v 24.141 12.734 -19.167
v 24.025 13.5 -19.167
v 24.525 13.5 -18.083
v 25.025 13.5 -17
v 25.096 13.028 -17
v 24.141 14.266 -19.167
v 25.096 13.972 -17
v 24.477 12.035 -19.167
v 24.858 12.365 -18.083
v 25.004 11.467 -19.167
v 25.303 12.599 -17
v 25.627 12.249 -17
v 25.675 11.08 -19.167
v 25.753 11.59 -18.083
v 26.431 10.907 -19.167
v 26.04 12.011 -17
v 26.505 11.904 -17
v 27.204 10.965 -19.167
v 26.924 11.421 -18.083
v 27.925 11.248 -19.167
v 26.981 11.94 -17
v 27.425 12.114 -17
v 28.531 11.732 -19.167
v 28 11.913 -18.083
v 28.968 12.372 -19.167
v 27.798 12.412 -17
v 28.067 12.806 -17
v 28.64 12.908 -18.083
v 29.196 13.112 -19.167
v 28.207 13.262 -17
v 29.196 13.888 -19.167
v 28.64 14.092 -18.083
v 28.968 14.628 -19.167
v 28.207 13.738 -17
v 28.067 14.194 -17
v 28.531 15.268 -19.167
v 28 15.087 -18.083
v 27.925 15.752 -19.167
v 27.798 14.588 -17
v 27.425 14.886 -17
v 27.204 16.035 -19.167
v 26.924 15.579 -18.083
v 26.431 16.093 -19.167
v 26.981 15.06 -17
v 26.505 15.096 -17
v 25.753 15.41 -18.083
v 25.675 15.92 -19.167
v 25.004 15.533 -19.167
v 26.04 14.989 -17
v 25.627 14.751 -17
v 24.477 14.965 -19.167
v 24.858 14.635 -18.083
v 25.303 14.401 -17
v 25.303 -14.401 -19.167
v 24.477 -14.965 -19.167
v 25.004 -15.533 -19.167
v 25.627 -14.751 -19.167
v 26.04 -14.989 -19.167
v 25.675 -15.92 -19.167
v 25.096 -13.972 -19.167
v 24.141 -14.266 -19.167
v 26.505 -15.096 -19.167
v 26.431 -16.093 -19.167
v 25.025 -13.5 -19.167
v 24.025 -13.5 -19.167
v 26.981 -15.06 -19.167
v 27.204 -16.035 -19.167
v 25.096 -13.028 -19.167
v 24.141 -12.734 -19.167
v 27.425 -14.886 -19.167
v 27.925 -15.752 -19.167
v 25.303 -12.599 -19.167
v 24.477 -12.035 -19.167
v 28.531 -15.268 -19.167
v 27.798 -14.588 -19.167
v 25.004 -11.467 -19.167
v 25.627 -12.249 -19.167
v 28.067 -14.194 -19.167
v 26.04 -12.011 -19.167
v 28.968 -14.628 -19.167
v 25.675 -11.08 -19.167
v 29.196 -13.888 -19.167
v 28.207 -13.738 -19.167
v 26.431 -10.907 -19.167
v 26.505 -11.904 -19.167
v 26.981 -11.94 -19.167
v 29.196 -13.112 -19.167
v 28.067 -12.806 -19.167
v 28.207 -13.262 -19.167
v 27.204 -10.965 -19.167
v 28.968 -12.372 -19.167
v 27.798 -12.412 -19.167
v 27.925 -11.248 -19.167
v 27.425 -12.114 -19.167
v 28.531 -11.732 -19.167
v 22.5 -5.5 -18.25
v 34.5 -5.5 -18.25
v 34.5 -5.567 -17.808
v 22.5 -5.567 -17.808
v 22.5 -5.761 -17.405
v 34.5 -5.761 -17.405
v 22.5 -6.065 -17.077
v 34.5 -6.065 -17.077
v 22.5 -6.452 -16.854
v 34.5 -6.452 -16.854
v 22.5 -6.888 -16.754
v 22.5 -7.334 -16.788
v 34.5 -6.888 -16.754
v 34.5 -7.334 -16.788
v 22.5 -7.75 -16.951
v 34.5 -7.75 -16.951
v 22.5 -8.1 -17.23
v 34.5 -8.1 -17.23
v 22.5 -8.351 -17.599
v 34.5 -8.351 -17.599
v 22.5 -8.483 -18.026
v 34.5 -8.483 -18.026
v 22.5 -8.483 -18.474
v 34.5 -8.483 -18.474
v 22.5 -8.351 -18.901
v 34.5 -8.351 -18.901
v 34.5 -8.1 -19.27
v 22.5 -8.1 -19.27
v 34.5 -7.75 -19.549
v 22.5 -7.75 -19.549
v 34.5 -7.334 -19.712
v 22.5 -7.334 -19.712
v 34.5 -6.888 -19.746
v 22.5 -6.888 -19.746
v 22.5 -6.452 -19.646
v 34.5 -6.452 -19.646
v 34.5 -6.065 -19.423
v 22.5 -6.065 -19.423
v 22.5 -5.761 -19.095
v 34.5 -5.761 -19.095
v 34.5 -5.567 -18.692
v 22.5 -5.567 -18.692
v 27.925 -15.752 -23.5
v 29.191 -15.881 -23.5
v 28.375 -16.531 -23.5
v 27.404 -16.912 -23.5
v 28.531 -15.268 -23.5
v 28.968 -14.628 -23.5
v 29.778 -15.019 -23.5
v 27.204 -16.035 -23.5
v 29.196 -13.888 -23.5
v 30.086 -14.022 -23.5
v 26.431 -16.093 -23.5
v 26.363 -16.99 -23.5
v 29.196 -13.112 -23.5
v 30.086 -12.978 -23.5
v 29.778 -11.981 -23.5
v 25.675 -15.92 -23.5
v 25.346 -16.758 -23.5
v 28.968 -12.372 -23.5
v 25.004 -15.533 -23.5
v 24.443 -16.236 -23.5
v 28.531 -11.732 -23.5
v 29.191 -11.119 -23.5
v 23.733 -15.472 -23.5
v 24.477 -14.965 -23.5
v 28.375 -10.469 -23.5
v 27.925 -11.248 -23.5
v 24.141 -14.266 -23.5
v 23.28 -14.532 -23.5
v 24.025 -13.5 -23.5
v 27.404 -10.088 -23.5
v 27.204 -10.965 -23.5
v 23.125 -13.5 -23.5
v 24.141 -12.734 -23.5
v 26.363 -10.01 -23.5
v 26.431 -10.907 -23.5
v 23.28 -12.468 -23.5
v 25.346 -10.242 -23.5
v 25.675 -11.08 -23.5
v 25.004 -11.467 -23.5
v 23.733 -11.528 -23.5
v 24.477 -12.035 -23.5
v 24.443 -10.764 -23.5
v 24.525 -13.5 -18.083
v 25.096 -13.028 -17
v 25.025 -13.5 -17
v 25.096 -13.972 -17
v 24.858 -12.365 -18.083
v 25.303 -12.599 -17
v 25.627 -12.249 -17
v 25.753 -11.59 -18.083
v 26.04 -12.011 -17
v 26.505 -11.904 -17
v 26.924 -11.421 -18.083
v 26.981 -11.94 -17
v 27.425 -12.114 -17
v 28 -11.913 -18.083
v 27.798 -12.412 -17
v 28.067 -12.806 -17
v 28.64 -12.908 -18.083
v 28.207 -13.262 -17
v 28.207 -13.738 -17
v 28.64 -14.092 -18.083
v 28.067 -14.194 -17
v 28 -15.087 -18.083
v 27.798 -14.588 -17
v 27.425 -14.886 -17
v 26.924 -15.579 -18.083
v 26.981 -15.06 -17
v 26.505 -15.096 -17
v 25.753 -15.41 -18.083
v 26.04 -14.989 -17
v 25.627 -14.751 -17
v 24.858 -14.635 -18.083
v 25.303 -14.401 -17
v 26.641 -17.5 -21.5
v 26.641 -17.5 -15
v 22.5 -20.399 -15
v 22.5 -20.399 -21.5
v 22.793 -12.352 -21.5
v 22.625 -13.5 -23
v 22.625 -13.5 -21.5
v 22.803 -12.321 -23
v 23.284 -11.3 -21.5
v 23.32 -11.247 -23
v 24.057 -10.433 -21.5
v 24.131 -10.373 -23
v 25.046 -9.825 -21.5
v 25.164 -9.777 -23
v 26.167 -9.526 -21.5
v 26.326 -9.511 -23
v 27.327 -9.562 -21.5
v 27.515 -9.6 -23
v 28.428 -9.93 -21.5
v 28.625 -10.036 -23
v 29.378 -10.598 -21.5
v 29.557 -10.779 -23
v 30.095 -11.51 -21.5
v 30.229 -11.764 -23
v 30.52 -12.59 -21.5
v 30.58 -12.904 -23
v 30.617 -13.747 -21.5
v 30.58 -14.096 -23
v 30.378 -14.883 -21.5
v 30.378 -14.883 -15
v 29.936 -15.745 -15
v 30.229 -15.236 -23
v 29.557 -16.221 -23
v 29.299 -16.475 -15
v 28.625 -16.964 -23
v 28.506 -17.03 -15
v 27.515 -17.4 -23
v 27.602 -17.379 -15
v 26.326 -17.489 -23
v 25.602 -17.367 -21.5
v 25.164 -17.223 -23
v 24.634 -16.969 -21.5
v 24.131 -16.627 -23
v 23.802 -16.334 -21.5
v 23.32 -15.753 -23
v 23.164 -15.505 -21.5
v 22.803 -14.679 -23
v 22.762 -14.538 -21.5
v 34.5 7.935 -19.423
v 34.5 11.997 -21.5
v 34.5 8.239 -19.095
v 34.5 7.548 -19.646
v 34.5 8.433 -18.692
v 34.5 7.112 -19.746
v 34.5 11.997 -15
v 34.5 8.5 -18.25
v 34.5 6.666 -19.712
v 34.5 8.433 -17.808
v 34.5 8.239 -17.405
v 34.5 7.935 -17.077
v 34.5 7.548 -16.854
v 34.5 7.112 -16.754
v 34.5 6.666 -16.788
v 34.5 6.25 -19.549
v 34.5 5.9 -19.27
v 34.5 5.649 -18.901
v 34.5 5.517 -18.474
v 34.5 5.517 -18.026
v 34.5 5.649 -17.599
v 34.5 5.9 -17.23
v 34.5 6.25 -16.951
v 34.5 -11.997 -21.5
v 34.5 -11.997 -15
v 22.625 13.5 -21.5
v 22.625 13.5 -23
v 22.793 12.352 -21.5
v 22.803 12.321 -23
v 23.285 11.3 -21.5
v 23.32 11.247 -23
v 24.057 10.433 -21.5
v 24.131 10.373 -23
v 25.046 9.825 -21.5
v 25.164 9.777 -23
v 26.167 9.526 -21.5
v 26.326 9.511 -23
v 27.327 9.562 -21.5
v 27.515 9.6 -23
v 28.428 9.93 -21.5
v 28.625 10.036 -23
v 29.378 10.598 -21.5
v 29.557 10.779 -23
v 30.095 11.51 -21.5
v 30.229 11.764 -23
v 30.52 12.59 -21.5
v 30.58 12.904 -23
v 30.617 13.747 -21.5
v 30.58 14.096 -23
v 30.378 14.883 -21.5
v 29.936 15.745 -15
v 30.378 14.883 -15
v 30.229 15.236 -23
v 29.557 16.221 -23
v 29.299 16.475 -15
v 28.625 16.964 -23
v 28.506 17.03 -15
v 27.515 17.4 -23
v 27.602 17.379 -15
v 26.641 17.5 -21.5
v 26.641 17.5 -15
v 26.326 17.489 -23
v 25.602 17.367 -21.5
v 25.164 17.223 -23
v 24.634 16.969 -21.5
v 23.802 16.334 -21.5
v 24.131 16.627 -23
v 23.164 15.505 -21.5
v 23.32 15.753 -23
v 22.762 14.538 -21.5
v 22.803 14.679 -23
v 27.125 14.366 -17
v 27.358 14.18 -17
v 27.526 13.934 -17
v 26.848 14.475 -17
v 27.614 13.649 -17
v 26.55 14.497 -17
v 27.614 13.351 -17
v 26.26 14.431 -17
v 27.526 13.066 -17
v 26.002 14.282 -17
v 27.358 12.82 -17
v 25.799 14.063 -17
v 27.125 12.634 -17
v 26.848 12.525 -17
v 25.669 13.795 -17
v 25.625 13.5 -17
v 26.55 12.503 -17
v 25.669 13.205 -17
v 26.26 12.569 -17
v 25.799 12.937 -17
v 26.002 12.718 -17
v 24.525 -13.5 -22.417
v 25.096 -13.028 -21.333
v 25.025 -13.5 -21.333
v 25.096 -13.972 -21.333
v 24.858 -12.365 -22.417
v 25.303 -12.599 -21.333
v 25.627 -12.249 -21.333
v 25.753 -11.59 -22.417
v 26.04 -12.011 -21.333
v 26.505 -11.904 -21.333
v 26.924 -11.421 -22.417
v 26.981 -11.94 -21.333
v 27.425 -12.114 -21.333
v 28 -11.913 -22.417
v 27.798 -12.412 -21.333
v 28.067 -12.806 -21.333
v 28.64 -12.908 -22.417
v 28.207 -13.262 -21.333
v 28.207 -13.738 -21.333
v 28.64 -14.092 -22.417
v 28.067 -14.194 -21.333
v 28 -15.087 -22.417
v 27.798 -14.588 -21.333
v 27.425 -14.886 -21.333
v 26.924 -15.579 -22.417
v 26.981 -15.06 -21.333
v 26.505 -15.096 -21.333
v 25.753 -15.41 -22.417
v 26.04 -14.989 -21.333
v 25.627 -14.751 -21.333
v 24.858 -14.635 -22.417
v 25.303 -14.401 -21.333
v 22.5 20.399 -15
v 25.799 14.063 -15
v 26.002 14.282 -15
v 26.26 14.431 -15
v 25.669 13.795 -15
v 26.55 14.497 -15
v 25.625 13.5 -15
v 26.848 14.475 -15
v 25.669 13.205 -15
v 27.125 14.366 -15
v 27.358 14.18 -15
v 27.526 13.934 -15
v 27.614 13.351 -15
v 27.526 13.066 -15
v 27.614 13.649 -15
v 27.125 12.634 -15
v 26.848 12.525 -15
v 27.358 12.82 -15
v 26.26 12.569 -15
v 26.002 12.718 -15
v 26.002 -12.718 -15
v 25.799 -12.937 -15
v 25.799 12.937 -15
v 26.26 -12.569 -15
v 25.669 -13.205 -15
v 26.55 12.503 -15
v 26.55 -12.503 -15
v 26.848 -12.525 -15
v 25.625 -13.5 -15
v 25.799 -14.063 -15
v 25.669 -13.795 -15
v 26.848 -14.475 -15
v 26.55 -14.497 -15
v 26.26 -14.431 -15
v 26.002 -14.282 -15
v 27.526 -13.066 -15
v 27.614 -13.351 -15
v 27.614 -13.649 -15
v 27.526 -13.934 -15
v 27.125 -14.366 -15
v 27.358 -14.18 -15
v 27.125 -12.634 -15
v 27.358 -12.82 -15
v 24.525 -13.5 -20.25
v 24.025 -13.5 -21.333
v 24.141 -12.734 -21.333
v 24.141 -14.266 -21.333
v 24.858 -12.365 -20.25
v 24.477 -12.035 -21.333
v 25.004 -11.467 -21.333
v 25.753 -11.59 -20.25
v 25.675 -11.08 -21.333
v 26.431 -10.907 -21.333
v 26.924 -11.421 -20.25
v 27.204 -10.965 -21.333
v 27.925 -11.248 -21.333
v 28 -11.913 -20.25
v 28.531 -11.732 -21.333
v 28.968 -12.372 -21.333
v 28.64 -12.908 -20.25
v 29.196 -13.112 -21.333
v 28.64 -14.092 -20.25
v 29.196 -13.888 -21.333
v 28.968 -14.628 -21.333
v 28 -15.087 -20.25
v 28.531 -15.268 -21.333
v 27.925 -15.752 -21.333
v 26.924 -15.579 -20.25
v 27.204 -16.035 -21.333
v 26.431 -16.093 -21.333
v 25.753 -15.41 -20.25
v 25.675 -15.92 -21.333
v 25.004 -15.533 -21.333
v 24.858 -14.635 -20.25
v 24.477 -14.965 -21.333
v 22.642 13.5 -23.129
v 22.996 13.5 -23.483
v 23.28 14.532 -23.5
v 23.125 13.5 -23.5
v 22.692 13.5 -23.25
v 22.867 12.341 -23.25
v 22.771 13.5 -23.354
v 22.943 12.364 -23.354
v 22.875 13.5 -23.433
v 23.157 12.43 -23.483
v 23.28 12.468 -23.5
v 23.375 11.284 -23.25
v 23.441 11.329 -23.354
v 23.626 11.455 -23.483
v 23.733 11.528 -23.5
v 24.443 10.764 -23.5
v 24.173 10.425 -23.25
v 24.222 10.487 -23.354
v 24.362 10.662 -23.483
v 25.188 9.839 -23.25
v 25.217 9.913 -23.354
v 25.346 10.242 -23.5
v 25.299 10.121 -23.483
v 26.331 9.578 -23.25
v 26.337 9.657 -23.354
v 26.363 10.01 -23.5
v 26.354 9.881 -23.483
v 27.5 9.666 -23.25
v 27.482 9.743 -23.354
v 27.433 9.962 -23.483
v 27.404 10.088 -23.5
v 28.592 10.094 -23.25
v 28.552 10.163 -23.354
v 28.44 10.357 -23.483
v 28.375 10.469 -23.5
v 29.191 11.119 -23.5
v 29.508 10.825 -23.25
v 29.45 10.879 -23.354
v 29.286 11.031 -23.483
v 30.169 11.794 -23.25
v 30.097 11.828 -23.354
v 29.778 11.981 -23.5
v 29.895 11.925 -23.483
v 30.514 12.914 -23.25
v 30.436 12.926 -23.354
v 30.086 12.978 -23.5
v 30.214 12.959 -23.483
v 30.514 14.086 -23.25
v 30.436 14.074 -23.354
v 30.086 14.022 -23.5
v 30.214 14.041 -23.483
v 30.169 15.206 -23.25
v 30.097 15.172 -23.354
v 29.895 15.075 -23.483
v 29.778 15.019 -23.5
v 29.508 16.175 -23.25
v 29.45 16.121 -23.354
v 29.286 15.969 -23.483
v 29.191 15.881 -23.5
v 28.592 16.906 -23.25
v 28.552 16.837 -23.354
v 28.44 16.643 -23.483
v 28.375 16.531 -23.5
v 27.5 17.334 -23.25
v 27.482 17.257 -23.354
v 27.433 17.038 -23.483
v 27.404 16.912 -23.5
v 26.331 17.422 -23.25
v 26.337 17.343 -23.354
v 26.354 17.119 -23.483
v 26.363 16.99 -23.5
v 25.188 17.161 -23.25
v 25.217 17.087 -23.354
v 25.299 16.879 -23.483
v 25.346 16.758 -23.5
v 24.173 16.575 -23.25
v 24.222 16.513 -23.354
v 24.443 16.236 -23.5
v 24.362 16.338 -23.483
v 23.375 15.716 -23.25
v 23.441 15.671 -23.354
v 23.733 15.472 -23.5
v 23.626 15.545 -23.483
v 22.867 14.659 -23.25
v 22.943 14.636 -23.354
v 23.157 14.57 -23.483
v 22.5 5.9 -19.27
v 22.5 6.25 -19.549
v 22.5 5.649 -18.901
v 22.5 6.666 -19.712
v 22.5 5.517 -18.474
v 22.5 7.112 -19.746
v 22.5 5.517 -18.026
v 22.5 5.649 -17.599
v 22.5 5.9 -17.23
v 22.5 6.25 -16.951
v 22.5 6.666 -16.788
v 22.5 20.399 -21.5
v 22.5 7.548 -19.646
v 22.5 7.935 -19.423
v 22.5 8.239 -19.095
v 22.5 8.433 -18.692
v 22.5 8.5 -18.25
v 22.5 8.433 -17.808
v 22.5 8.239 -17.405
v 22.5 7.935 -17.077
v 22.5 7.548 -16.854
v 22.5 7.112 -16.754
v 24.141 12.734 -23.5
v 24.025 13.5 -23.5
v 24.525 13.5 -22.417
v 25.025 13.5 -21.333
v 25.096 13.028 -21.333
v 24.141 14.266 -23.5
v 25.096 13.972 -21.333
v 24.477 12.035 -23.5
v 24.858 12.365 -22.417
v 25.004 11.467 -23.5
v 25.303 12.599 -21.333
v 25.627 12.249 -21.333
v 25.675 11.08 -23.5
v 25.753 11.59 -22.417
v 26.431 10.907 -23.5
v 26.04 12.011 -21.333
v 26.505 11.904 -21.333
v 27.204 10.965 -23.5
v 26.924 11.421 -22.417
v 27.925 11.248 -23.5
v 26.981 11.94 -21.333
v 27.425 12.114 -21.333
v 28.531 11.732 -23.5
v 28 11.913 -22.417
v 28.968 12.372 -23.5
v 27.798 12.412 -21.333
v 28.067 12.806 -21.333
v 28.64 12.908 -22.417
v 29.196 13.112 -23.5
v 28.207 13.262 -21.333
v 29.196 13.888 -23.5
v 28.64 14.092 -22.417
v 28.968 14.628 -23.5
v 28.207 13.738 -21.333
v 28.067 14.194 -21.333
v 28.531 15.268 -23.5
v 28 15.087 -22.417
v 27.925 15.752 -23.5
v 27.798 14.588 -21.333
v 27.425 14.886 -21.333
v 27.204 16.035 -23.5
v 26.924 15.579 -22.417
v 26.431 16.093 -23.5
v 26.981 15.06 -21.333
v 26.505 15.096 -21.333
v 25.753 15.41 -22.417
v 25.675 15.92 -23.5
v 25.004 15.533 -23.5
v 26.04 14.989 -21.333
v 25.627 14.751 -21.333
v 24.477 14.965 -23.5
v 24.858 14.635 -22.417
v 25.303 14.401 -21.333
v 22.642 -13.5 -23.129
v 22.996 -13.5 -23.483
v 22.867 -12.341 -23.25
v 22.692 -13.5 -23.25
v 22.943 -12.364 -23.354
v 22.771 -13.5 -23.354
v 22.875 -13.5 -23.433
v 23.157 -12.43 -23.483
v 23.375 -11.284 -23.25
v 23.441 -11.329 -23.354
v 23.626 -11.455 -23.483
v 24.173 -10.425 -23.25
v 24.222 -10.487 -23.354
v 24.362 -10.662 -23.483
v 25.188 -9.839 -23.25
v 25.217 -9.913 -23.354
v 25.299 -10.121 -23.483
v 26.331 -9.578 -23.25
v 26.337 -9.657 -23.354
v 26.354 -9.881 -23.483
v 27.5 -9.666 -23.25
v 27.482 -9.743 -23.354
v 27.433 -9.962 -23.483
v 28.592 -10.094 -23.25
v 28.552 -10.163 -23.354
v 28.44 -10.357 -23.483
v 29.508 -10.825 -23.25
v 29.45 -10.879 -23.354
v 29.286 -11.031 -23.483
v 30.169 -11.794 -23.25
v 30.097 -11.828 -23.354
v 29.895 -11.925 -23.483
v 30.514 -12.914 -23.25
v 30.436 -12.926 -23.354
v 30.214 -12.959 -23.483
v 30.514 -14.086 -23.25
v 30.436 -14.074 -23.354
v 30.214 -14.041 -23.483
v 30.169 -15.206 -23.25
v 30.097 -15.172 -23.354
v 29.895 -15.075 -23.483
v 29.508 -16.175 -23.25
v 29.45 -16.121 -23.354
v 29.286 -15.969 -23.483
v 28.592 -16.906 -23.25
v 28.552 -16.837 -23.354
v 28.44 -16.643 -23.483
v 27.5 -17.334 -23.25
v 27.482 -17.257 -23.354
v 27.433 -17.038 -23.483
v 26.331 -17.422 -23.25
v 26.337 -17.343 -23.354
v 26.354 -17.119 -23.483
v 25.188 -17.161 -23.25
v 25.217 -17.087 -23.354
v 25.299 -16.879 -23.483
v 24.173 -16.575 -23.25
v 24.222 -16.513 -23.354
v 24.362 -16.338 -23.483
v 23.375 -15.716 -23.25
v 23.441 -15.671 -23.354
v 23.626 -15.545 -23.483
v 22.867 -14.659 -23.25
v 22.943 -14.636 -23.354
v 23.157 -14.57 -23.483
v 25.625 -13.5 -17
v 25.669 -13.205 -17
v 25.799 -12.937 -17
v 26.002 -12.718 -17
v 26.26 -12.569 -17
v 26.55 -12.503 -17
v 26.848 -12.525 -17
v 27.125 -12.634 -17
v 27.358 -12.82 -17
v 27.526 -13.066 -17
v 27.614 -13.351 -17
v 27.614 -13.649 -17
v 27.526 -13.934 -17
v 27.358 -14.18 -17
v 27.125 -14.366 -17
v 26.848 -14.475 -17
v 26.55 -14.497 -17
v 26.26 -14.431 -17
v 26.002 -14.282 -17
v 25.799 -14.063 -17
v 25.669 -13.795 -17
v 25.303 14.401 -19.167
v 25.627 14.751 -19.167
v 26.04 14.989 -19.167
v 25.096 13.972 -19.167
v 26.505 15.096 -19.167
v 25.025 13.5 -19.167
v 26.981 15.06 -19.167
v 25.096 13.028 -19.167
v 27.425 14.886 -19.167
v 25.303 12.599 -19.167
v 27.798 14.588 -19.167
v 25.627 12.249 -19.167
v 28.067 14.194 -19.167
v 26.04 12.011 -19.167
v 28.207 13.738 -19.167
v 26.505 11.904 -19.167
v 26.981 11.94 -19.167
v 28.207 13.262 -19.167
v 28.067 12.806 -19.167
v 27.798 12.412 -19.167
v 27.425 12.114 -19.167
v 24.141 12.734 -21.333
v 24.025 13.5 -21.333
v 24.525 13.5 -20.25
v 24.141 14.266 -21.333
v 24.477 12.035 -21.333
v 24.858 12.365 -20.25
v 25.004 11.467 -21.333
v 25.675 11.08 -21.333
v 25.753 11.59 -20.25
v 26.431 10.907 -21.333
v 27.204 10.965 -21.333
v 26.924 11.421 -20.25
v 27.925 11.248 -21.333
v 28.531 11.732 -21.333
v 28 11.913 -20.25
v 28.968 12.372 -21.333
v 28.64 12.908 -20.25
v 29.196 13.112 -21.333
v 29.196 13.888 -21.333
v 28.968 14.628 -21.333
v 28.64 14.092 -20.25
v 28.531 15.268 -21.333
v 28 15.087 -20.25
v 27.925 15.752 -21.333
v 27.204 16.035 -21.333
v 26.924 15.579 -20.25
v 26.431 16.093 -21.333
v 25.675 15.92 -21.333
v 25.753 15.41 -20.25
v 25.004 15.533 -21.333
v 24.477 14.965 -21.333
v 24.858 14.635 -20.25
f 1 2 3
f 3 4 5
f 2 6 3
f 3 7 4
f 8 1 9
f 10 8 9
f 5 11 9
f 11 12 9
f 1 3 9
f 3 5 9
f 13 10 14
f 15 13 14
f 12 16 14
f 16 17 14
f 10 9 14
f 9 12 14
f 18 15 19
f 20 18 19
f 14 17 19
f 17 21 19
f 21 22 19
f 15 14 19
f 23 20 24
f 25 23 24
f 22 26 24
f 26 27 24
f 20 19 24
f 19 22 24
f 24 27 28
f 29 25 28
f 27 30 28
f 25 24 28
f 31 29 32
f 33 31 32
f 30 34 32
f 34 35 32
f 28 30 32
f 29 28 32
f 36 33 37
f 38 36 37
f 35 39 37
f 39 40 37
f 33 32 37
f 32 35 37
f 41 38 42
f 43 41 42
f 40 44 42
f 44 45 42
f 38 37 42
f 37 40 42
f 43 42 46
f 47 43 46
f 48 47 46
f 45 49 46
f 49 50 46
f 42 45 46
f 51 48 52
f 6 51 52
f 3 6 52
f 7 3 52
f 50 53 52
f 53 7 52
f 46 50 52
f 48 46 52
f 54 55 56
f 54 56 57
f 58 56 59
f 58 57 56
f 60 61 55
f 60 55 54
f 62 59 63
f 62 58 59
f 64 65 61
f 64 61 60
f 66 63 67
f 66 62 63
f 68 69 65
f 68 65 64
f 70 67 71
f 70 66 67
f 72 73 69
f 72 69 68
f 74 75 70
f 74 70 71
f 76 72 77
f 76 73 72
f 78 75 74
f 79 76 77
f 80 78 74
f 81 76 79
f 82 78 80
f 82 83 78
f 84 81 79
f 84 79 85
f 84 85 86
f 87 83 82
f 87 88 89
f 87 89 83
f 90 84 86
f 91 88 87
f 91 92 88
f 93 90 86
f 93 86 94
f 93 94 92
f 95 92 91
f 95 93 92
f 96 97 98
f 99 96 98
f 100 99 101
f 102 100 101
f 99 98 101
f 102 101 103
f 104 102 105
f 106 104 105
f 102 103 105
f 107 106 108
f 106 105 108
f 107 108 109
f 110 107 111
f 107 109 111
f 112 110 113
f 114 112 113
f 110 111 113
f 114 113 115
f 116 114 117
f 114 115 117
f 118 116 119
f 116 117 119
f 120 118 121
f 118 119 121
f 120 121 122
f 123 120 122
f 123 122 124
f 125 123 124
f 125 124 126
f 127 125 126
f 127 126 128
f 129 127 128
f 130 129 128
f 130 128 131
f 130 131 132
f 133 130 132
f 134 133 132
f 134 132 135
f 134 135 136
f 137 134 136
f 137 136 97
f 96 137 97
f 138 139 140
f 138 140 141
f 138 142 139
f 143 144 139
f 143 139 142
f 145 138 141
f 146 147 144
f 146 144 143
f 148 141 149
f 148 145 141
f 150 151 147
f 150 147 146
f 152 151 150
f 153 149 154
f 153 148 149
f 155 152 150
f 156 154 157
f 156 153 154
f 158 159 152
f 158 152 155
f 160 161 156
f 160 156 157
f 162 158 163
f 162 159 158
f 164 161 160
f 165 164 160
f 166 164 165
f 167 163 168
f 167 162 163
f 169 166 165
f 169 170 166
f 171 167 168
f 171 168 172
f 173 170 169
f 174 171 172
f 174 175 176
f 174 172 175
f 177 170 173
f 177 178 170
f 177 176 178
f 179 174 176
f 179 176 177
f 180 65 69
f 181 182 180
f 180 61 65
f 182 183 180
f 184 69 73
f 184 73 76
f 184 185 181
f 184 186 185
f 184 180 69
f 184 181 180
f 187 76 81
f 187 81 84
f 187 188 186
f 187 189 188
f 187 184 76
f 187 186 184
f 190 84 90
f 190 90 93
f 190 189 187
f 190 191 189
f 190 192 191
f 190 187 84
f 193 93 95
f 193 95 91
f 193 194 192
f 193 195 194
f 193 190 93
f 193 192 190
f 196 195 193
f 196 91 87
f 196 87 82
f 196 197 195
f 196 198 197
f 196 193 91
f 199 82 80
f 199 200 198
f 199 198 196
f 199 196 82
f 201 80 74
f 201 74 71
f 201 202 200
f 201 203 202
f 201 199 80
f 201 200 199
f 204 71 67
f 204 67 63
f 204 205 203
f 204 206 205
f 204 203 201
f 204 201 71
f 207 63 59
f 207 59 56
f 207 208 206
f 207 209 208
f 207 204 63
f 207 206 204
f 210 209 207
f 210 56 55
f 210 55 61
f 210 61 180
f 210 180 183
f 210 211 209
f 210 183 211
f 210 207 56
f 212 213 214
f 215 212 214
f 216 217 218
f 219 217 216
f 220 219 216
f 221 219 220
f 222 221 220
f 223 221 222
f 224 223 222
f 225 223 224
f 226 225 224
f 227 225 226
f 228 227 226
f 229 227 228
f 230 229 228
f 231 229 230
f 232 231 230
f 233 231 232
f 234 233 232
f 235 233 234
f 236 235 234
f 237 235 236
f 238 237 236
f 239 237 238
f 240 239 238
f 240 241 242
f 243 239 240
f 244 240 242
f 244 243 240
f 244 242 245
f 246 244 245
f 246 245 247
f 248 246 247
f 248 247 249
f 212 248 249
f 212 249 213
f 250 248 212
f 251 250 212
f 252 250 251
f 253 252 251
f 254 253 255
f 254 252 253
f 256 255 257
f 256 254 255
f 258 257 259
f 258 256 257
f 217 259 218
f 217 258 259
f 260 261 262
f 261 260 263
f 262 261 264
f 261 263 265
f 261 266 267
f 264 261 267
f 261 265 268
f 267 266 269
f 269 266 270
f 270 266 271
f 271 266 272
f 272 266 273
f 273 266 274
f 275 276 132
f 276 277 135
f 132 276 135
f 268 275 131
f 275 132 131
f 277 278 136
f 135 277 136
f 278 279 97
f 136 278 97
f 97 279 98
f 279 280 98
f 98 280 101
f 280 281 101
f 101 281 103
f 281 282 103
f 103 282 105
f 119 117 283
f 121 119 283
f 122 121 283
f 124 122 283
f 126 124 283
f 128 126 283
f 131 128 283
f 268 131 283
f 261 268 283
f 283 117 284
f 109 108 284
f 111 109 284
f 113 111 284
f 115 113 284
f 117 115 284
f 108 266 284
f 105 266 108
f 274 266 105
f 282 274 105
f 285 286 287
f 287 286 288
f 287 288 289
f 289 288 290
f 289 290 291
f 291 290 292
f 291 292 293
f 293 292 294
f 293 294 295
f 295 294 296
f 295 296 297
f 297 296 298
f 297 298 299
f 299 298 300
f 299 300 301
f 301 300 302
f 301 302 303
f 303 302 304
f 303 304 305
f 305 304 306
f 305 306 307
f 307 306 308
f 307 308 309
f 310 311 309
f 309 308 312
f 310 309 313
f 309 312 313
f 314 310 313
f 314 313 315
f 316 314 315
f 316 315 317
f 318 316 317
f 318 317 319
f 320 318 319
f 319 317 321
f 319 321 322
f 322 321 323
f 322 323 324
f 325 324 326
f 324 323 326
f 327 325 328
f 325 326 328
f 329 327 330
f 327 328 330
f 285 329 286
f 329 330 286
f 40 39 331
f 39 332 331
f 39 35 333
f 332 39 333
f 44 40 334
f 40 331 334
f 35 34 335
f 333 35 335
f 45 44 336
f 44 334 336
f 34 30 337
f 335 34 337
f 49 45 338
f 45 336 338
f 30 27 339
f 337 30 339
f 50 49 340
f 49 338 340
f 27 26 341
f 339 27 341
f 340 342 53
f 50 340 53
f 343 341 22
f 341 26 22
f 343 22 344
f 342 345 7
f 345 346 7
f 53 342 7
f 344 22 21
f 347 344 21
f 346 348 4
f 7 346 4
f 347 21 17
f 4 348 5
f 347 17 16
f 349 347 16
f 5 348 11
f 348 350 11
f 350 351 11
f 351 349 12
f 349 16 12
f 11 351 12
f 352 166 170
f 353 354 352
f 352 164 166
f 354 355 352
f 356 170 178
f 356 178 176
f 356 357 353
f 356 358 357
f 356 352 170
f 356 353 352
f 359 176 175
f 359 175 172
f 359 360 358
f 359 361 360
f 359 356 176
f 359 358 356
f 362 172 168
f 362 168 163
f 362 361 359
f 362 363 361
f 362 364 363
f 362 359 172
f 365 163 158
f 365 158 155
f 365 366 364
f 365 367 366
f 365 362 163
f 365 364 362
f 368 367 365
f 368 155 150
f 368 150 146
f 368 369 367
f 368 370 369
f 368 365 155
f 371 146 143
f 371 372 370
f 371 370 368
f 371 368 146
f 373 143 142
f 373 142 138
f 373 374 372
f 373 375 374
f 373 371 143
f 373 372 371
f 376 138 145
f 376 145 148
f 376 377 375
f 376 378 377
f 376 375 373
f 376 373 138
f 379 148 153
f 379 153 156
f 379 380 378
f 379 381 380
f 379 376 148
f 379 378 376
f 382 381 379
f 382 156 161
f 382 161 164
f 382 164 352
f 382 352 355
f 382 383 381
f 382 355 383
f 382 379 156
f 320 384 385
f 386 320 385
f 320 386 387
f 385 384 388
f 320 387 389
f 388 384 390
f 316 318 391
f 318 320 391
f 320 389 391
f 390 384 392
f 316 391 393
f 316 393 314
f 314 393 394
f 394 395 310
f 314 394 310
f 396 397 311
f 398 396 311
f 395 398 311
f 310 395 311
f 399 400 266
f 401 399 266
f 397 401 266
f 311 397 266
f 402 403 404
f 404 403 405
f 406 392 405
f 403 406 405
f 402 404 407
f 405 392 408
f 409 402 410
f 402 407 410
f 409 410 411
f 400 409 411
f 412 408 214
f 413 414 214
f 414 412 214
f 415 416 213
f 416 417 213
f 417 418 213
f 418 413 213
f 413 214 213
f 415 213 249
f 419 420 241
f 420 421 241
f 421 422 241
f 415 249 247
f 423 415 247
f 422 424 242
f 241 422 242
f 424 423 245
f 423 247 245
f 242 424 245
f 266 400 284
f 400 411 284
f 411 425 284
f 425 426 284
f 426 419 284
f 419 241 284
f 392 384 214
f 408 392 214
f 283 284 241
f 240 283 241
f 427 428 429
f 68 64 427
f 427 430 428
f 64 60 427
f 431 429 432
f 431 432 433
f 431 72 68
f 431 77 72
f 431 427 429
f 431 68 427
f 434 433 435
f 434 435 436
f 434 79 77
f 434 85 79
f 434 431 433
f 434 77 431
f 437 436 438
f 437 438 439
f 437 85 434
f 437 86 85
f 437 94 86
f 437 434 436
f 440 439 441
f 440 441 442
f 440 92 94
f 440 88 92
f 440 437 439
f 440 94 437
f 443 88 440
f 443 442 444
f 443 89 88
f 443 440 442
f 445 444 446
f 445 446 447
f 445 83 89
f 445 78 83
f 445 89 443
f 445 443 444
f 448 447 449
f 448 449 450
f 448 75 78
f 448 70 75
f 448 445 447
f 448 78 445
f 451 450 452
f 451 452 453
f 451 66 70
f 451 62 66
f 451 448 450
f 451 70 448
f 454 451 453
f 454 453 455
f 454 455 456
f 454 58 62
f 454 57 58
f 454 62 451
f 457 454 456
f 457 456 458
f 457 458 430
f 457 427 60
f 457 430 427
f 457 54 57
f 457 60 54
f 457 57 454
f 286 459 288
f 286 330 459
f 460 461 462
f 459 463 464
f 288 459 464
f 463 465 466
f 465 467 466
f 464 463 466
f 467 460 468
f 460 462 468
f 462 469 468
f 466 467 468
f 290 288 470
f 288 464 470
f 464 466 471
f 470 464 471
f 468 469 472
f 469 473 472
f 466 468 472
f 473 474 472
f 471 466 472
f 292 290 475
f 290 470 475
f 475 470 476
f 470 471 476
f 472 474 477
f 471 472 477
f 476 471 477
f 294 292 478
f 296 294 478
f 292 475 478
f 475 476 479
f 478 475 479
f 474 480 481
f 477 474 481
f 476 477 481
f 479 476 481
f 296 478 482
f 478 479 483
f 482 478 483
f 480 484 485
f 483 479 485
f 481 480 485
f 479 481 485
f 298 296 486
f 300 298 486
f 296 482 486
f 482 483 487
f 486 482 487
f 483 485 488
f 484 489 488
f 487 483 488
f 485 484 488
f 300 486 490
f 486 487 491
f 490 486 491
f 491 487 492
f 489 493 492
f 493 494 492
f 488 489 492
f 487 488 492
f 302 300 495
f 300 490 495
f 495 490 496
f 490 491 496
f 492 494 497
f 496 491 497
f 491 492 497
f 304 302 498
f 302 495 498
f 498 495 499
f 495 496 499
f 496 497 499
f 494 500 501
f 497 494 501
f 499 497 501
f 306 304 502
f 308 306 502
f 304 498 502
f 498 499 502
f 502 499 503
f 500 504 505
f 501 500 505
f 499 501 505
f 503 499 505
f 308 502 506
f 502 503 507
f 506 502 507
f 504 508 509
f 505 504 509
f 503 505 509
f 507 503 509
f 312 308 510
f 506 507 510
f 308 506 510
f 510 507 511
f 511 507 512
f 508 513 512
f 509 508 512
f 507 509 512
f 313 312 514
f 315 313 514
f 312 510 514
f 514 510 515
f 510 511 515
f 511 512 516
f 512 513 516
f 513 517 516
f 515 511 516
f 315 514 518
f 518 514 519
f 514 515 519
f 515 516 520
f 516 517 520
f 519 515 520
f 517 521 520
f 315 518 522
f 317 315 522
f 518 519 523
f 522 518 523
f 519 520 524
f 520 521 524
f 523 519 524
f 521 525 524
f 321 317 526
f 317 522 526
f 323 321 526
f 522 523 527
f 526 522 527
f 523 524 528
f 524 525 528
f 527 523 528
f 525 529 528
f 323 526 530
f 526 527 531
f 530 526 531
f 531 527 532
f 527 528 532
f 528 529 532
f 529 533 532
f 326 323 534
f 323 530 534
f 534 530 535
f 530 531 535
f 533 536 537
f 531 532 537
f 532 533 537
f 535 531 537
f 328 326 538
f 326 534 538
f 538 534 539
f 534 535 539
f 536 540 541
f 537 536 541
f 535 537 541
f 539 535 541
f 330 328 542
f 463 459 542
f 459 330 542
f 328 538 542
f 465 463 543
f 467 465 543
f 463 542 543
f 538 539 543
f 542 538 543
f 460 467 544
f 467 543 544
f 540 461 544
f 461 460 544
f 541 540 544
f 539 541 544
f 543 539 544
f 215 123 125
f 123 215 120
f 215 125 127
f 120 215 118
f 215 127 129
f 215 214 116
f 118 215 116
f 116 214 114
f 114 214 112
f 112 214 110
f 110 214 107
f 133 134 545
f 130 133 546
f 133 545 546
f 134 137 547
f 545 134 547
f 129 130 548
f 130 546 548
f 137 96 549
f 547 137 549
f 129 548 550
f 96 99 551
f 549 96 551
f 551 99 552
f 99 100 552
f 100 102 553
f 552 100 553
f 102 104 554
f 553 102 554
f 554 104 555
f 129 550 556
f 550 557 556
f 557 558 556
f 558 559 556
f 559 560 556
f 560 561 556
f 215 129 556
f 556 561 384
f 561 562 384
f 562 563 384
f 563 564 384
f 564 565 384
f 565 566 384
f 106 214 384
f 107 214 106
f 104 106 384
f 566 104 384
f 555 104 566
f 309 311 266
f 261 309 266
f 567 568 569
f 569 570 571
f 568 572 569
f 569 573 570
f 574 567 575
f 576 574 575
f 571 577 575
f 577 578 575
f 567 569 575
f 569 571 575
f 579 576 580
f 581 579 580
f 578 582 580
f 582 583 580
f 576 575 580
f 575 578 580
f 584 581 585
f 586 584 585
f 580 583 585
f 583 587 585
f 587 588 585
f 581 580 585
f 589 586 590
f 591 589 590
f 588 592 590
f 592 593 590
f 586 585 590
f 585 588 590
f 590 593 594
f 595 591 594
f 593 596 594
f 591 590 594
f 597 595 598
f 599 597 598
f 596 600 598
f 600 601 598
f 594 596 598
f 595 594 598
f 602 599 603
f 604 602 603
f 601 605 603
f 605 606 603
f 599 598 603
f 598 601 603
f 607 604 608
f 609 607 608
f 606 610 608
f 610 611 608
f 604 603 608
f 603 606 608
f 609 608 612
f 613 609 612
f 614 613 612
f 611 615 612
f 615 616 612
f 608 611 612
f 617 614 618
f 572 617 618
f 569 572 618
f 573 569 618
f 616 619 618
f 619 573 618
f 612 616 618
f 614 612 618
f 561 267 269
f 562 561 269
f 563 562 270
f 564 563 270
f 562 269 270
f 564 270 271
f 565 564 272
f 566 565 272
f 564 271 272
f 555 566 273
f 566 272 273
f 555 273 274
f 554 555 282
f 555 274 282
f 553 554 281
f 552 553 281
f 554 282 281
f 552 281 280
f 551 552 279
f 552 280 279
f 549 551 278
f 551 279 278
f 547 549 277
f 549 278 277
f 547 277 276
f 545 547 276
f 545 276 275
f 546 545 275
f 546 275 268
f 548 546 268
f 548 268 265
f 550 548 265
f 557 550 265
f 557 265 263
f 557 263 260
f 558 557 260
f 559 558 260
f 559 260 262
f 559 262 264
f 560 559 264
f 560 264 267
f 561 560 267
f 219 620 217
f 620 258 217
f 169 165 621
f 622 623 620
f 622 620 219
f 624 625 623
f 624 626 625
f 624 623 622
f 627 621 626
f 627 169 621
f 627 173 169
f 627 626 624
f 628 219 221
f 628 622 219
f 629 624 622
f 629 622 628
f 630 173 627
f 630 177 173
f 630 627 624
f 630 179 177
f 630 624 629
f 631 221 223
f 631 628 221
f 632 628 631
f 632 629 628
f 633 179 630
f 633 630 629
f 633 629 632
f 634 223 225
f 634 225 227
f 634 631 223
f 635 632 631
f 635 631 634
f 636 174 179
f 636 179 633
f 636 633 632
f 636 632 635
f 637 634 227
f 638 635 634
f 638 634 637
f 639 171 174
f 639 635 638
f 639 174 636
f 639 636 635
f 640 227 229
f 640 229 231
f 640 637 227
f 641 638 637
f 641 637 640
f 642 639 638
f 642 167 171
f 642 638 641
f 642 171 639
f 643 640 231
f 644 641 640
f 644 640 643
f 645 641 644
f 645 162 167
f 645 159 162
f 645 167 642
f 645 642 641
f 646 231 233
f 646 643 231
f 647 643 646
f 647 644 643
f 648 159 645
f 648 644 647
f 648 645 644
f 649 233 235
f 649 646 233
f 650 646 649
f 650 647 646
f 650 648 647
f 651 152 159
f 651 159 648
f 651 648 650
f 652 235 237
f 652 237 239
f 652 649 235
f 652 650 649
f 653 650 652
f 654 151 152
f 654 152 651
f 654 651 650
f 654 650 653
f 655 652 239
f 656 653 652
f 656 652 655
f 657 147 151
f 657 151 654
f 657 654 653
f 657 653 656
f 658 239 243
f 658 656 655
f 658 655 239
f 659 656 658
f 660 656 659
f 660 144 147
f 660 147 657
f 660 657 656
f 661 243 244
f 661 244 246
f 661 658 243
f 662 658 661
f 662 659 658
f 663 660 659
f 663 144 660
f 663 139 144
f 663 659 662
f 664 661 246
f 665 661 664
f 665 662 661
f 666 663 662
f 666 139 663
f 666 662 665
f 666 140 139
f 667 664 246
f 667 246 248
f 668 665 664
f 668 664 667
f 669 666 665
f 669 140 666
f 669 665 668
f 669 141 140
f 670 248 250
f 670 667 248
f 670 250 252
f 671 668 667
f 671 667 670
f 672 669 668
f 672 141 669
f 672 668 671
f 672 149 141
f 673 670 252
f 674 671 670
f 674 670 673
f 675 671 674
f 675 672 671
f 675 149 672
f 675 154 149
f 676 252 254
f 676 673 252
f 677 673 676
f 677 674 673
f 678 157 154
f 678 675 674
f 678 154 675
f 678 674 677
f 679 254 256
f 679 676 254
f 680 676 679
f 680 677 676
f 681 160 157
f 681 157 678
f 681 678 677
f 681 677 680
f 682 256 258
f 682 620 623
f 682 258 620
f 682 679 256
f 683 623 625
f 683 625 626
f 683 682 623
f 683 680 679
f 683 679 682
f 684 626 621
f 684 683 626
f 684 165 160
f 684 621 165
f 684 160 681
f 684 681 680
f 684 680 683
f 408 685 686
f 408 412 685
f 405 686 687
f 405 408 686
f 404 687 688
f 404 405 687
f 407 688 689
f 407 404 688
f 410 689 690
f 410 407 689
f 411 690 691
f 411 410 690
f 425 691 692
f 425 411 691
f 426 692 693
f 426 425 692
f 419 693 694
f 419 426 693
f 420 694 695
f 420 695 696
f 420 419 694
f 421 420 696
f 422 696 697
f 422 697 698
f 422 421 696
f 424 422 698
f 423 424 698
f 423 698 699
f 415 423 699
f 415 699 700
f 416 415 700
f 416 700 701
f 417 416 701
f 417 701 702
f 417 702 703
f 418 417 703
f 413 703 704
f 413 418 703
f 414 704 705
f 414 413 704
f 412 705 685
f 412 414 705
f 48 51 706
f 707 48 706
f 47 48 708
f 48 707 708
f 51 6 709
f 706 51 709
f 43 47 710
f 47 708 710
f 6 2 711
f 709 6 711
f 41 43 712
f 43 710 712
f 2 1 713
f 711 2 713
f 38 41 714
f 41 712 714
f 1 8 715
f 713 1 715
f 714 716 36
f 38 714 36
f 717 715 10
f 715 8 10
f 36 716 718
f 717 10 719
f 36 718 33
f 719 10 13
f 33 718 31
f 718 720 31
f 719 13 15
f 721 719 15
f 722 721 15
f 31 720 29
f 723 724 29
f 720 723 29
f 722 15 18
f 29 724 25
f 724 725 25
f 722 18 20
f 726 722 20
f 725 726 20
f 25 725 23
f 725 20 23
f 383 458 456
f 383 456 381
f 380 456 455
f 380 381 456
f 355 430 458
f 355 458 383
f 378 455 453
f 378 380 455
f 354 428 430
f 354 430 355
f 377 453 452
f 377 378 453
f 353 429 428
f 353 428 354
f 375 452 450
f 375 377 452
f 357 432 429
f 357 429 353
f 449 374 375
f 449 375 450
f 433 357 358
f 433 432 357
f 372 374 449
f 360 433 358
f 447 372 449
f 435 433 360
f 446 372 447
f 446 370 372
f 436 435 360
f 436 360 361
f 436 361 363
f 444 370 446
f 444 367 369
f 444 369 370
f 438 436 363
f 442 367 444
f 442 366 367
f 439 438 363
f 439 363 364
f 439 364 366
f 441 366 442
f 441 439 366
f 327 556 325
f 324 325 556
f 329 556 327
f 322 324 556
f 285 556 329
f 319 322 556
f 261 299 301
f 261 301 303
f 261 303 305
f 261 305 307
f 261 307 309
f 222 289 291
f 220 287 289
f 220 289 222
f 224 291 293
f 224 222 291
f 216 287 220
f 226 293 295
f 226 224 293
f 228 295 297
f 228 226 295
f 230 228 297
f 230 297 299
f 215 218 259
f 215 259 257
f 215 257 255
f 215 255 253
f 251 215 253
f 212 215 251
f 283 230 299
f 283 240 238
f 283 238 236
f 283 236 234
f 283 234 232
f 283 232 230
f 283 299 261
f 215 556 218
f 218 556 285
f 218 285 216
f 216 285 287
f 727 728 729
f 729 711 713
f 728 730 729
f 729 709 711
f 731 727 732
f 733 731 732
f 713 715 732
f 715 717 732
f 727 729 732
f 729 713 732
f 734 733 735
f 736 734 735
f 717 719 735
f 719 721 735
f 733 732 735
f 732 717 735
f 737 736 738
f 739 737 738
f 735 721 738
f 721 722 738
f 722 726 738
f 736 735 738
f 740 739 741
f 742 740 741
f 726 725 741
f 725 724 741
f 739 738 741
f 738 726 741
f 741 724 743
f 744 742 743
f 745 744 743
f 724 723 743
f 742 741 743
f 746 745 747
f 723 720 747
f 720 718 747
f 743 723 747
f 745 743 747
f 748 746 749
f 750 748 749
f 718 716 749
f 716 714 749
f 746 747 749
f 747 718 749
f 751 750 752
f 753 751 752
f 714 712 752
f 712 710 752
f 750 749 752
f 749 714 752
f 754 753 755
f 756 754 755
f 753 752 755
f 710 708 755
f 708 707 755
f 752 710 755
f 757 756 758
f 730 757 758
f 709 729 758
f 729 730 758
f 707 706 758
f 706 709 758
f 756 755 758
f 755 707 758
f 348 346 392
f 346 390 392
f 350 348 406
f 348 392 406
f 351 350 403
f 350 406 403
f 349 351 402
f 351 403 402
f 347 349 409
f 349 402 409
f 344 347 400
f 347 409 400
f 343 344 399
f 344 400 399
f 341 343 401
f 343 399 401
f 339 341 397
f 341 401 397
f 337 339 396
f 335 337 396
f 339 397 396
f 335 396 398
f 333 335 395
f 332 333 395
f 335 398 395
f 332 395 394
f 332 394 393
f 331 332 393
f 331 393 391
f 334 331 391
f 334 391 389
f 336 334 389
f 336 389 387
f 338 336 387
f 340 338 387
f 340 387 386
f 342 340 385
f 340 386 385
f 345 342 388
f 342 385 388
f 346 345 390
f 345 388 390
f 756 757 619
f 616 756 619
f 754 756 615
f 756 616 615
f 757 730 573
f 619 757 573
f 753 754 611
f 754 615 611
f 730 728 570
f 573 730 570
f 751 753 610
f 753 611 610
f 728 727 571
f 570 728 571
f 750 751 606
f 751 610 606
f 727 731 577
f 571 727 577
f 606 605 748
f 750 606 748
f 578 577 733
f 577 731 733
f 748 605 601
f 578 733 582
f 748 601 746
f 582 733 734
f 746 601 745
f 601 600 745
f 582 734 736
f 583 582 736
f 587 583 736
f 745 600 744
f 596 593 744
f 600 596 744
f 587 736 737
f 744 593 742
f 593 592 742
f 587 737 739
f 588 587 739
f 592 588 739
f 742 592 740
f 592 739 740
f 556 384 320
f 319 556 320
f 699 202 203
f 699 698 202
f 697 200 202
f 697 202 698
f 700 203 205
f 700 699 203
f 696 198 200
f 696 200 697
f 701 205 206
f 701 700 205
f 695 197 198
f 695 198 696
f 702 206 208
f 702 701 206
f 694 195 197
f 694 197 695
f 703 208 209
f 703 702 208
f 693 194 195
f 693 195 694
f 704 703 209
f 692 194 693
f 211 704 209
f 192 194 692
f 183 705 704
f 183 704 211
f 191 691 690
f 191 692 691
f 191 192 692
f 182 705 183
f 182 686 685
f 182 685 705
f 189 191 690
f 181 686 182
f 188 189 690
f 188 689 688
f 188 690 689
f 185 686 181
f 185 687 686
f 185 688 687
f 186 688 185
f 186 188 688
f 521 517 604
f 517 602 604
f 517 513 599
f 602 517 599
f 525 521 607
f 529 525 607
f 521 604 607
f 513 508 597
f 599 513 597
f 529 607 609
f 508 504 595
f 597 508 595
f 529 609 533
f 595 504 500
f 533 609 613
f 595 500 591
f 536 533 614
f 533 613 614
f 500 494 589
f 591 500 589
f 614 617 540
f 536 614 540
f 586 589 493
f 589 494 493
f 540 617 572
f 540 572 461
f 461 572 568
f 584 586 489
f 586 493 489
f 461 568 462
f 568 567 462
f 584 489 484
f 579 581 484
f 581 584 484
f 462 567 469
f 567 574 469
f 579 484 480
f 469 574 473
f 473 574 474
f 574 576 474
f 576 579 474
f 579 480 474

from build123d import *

# Parameters (mm, degrees)
SKETCH020_R      = 1.5
EXTRUDE013_DEPTH = 100
SKETCH019_R      = 4
EXTRUDE012_DEPTH = 10
EXTRUDE014_DEPTH = 6.5
FILLET017_R      = 0.5
FILLET018_R      = 0.5


with BuildPart() as extrude013:
    # Sketch020 → Extrude013 (new body)
    with BuildSketch(Plane.YZ.offset(34.5)):
        with Locations((-7, -18.25)):
            Circle(SKETCH020_R)
        with Locations((7, -18.25)):
            Circle(SKETCH020_R)
    extrude(amount=-EXTRUDE013_DEPTH)


with BuildPart() as extrude012:
    # Sketch019 → Extrude012 (new body, symmetric)
    with BuildSketch(Plane.XY.offset(-20)):
        with Locations((26.625, 13.5)):
            Circle(SKETCH019_R)
        with Locations((26.625, -13.5)):
            Circle(SKETCH019_R)
    extrude(amount=EXTRUDE012_DEPTH, both=True)


with BuildPart() as extrude014:
    # Sketch022 → Extrude014 (new body)
    with BuildSketch(Plane(origin=(0, 0, -15), x_dir=(1, 0, 0), z_dir=(0, 0, -1))):
        Polygon((-22.5, 20.399377), (-22.5, -20.399423), (-34.5, -11.996933), (-34.5, 11.996887), align=None)
    extrude(amount=EXTRUDE014_DEPTH)


with BuildPart() as cut012:
    # Part__Mirroring001: instance of Extrude014
    add(extrude014.part.mirror(Plane(origin=(0, 0, 0), x_dir=(0, -1, 0), z_dir=(1, 0, 0))))

    # Cut011: cut Extrude012
    add(extrude012.part, mode=Mode.SUBTRACT)

    # Cut012: cut Extrude013
    add(extrude013.part, mode=Mode.SUBTRACT)


with BuildPart() as fillet017:
    # Sketch041 → Revolve003 (revolve)
    with BuildSketch(Plane.XZ):
        Polygon((22.625, -15), (22.625, -23.5), (24.025, -23.5), (25.025, -21.333333), (24.025, -21.333333), (25.025, -19.166667), (24.025, -19.166667), (25.025, -17), (25.625, -17), (25.625, -15), align=None)
    revolve(axis=Axis((26.625, 0, 0), (0, 0, 1)))


with BuildPart() as fillet017_1:
    # Revolve003 placement: moved
    add(fillet017.part.moved(Location((0, 13.5, 0))))

    # Fillet017
    fillet017_edges = [fillet017_1.edges().sort_by_distance(p)[0] for p in [
        (30.625, 13.5, -23.5),
    ]]
    fillet(fillet017_edges, radius=FILLET017_R)


with BuildPart() as fillet018:
    # Sketch042 → Revolve004 (revolve)
    with BuildSketch(Plane.XZ):
        Polygon((22.625, -15), (22.625, -23.5), (24.025, -23.5), (25.025, -21.333333), (24.025, -21.333333), (25.025, -19.166667), (24.025, -19.166667), (25.025, -17), (25.625, -17), (25.625, -15), align=None)
    revolve(axis=Axis((26.625, 0, 0), (0, 0, 1)))


with BuildPart() as fillet018_1:
    # Revolve004 placement: moved
    add(fillet018.part.moved(Location((0, 13.5, 0))))

    # Fillet018
    fillet018_edges = [fillet018_1.edges().sort_by_distance(p)[0] for p in [
        (30.625, 13.5, -23.5),
    ]]
    fillet(fillet018_edges, radius=FILLET018_R)


with BuildPart() as boden_tube_bracket_w_one_way_fitting:
    # Part__Mirroring002: instance of Fillet018
    add(fillet018_1.part.mirror(Plane(origin=(0, 0, 0), x_dir=(1, 0, 0), z_dir=(0, 1, 0))))

    # Fusion014: union Cut012, Fillet017
    add(cut012.part)
    add(fillet017_1.part)


solid = boden_tube_bracket_w_one_way_fitting.part
